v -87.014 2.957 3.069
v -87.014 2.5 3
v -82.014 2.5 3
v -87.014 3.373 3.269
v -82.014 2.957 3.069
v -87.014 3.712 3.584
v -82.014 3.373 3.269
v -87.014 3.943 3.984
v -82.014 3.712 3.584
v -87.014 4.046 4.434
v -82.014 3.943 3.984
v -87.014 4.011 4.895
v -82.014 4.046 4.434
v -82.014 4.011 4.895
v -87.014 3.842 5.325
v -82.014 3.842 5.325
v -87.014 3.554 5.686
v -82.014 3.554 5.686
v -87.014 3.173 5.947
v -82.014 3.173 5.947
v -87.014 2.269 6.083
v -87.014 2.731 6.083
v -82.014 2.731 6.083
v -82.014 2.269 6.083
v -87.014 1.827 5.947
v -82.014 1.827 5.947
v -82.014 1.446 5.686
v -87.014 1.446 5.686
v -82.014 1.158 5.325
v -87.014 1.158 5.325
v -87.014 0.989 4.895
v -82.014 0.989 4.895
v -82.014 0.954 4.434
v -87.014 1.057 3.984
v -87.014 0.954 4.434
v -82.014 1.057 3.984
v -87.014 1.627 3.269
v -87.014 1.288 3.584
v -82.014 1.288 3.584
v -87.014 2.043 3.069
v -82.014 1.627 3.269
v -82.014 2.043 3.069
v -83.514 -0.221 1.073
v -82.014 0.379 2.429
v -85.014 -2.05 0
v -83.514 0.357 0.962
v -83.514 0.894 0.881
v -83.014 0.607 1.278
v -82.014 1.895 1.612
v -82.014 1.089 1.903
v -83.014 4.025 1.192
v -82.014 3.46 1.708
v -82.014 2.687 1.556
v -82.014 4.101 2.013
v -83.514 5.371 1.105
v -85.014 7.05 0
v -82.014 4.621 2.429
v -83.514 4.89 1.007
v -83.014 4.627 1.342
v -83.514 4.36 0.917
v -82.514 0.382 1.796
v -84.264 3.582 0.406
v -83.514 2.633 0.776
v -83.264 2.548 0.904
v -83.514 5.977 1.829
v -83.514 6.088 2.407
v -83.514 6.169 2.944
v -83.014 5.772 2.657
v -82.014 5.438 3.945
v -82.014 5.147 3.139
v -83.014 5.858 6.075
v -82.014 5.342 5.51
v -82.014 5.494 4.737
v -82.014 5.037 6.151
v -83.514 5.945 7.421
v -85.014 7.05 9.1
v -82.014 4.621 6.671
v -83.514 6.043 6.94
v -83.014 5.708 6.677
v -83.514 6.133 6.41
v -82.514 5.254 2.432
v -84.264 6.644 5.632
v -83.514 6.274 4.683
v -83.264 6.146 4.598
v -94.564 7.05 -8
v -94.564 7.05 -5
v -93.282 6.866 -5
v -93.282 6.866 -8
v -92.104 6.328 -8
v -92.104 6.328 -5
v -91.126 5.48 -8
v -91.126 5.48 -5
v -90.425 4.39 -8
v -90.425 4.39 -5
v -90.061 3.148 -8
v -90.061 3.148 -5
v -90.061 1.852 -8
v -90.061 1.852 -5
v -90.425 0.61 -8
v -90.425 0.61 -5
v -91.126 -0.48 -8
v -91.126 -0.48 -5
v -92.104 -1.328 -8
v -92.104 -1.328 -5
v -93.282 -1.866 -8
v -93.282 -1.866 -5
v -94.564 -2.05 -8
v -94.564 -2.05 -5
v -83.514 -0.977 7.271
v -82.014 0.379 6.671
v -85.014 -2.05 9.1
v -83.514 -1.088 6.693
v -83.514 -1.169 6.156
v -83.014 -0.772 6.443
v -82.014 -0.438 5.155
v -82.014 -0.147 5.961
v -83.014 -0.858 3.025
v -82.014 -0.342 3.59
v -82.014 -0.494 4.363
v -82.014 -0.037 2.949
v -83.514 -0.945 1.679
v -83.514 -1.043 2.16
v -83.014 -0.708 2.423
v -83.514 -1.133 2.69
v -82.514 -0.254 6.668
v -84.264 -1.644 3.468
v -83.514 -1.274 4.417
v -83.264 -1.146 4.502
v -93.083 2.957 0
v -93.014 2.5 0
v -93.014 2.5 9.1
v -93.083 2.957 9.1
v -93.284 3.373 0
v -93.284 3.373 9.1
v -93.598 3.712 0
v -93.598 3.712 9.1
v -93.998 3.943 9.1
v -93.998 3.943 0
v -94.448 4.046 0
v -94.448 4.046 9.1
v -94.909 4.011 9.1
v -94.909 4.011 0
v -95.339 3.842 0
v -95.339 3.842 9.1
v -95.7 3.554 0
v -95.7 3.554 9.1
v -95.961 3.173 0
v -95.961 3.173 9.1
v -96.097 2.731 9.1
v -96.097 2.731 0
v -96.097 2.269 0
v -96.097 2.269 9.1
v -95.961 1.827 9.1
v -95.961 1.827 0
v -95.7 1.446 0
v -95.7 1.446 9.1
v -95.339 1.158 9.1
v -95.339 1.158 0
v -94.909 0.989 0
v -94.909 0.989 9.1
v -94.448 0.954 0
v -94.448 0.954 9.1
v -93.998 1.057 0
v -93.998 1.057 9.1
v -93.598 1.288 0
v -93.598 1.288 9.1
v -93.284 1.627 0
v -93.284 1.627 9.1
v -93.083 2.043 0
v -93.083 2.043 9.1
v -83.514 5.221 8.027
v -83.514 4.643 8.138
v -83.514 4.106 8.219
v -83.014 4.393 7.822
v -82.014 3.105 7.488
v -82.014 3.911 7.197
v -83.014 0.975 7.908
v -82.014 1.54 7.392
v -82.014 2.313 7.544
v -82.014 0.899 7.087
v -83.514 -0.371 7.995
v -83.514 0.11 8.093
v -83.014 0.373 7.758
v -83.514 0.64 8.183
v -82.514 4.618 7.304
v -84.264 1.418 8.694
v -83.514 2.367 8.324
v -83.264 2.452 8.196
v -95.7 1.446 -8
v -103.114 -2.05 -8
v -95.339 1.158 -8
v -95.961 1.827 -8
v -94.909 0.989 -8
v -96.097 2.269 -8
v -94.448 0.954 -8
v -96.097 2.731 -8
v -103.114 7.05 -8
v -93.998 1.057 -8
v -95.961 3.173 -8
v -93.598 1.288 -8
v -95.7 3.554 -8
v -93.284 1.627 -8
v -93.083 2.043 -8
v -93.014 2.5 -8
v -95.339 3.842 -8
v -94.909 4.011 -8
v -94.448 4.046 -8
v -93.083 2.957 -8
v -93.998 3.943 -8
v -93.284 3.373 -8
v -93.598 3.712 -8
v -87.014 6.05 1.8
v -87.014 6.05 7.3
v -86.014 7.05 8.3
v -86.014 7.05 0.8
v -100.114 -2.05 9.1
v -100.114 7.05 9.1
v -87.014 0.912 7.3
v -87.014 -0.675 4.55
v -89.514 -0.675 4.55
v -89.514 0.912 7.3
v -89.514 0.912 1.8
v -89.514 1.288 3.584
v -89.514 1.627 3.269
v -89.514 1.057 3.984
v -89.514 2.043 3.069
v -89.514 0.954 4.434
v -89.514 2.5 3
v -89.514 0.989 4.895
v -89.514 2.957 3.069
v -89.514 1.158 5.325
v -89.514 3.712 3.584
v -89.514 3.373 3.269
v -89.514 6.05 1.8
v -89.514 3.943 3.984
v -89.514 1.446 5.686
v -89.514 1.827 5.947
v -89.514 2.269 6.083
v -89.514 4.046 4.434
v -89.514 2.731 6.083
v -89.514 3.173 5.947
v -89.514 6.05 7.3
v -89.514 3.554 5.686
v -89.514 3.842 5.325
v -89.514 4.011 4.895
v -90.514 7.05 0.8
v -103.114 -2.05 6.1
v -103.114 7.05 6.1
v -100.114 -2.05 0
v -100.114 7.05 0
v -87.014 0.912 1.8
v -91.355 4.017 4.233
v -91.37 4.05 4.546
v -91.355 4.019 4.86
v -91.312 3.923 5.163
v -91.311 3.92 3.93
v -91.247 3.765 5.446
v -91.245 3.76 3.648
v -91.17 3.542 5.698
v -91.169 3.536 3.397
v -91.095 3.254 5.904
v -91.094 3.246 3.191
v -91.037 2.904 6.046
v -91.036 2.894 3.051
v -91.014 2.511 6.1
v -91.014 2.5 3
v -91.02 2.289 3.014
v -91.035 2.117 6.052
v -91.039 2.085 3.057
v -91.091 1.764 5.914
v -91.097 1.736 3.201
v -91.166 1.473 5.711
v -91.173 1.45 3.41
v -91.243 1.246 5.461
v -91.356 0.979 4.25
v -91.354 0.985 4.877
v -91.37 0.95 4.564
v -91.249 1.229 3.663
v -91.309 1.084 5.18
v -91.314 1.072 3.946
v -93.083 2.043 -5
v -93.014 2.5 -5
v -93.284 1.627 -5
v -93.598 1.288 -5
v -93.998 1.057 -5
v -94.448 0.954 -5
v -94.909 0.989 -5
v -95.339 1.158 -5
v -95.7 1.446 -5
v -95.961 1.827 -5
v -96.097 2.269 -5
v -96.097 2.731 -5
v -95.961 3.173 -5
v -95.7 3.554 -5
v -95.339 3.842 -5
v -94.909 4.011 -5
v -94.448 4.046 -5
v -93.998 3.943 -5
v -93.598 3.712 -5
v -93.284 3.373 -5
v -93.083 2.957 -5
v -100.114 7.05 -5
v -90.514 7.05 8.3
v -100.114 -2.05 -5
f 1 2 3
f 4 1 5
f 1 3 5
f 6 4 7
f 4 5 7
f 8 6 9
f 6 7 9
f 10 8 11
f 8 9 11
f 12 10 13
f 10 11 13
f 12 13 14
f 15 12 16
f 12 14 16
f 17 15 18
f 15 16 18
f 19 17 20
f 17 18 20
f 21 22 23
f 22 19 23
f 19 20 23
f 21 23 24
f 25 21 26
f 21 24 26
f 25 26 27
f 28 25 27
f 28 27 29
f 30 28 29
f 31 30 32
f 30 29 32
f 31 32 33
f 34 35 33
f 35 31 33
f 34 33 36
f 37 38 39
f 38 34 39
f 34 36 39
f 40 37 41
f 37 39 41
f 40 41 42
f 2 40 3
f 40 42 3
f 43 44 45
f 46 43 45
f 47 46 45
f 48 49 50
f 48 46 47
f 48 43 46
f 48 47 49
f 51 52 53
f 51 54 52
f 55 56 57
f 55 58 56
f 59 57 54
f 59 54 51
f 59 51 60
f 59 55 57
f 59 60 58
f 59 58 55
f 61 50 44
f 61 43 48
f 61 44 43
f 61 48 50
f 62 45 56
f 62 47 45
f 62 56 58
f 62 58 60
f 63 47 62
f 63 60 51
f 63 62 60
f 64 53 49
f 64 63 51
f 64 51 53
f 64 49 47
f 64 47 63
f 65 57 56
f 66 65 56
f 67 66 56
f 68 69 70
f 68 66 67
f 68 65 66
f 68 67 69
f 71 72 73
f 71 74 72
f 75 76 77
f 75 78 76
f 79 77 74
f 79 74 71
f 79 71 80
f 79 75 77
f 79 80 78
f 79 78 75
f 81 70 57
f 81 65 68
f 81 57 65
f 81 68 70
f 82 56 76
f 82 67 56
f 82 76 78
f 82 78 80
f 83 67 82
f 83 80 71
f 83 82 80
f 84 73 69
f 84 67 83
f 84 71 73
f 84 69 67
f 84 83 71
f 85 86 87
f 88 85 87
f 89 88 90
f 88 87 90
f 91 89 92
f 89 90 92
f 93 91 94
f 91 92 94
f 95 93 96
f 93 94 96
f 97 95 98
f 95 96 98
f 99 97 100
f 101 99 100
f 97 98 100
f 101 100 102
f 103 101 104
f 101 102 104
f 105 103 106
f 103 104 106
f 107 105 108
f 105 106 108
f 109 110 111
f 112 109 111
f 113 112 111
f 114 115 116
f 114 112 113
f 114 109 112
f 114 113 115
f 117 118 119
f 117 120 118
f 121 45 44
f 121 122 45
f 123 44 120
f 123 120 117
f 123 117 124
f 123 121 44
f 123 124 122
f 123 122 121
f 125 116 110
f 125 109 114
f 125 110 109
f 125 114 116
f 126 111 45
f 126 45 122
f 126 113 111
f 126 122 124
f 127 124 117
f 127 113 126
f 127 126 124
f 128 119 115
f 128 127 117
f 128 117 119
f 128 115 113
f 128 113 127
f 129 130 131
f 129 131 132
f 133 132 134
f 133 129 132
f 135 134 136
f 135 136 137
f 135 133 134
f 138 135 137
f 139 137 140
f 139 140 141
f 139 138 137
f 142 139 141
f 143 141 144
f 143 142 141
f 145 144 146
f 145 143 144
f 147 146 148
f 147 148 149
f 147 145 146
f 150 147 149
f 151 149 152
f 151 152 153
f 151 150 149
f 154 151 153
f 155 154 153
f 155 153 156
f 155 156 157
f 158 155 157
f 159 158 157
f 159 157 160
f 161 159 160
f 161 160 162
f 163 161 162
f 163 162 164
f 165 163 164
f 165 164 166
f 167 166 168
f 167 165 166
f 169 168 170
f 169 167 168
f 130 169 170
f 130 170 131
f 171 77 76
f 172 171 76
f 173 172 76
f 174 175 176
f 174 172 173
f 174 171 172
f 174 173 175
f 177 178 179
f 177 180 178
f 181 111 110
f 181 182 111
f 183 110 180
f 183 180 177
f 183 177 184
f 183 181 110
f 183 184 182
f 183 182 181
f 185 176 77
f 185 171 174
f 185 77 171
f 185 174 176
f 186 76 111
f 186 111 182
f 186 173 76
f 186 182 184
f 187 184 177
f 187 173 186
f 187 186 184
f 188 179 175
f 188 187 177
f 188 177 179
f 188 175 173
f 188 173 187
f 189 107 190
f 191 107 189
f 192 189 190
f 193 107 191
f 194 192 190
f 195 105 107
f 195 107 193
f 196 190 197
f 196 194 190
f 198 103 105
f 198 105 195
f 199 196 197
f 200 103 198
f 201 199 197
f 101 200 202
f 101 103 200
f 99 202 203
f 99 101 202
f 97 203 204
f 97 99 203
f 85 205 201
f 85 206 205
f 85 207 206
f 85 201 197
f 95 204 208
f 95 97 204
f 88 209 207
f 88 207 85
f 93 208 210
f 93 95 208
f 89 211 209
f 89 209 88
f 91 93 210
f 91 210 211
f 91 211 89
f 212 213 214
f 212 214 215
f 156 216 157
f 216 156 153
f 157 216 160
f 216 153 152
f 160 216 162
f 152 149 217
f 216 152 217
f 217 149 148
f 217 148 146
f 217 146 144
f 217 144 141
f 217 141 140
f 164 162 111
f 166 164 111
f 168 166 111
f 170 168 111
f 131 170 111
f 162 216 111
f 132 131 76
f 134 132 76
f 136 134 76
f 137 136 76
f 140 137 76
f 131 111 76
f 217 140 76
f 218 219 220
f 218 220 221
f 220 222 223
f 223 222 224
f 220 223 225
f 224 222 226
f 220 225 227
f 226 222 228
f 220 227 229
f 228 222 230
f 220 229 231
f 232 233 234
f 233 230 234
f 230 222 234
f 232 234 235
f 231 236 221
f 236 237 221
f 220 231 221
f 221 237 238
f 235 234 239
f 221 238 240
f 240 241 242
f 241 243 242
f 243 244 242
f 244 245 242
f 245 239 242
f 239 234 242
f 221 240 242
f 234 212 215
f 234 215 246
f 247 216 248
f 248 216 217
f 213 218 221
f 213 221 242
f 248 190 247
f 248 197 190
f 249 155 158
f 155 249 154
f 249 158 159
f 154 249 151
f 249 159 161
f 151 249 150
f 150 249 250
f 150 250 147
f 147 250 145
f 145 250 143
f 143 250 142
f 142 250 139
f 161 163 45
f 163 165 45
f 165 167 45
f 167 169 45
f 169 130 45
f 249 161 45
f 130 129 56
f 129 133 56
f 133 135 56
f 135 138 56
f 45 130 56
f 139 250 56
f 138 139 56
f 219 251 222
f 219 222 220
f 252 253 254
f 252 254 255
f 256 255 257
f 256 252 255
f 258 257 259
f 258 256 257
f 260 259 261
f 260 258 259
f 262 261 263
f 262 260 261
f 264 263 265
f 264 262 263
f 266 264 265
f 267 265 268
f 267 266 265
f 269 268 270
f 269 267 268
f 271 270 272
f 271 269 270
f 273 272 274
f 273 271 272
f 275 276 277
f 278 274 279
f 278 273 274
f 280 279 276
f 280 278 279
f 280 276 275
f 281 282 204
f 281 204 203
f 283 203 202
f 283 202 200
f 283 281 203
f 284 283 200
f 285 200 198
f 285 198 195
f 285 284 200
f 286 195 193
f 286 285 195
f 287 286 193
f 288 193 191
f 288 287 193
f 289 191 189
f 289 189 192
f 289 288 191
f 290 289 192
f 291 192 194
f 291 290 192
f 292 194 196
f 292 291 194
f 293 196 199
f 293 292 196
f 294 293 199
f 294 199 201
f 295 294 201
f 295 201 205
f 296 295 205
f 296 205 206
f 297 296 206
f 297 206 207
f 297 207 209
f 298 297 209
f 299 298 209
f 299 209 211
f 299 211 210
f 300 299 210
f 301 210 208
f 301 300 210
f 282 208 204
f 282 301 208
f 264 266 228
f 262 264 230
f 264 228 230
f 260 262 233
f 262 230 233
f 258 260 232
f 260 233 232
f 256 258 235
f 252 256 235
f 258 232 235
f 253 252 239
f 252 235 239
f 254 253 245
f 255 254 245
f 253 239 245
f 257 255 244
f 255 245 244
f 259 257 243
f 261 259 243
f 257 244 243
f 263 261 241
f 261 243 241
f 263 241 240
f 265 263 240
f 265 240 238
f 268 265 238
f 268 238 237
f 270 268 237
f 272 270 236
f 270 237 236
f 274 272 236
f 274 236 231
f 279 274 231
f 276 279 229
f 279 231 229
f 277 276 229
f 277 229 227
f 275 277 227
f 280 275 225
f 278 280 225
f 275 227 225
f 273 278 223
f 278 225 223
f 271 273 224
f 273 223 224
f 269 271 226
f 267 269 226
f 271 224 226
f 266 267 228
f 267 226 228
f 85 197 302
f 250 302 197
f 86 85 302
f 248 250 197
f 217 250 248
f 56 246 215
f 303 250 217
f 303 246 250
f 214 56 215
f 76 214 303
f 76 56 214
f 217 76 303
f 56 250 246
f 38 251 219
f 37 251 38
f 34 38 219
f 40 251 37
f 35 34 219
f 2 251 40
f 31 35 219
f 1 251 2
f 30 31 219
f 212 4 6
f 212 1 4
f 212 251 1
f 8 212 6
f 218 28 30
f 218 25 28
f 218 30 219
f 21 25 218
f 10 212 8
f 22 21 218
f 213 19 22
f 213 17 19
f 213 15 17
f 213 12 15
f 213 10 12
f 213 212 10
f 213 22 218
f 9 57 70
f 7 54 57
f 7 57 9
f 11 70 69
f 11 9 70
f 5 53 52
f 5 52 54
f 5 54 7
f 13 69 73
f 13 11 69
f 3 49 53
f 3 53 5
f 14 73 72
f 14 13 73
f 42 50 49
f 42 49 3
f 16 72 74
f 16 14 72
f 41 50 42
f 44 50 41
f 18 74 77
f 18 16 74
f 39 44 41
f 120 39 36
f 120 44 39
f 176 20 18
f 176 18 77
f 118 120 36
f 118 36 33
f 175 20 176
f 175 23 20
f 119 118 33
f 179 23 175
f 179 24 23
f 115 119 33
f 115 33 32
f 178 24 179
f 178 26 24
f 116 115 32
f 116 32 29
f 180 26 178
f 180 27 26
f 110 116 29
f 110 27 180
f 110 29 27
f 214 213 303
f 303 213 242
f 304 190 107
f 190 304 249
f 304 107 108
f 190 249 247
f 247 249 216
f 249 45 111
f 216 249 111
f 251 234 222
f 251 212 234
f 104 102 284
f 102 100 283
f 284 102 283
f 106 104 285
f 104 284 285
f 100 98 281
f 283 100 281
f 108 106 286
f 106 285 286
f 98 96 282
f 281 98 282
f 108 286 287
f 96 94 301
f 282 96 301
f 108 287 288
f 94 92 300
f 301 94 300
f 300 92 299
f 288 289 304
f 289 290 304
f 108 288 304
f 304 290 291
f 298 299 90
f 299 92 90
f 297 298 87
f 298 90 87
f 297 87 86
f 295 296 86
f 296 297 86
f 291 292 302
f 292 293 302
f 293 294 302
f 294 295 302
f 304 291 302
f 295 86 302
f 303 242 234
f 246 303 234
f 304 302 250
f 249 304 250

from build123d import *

# Parameters (mm, degrees)
SKETCH1_R               = 4.55
SKETCH1_R_2             = 1.55
BOSS_EXTRUDE1_DEPTH     = 9.1
SKETCH2_R               = 1.55
BOSS_EXTRUDE2_DEPTH     = 3
SKETCH3_W               = 17.1
SKETCH3_H               = 9.1
BOSS_EXTRUDE3_DEPTH     = 3
CUT_EXTRUDE1_REACH      = 26.036
CUT_EXTRUDE1_END_RADIUS = 3.55
SKETCH4_R               = 1.55
SKETCH5_R               = 1.55
CUT_EXTRUDE2_DEPTH      = 2.5
CHAMFER1_SIZE           = 1
CHAMFER2_SIZE           = 3


with BuildPart() as part:
    # Sketch1 → Boss-Extrude1 (new body)
    # profile 1 of 3: a face of its own
    with BuildSketch(Plane.XY):
        with Locations((-94.564189657, 2.5)):
            Circle(SKETCH1_R)
        with Locations((-94.564189657, 2.5)):
            Circle(SKETCH1_R_2, mode=Mode.SUBTRACT)
    # profile 2 of 3: a face of its own
    with BuildSketch(Plane.XY):
        with BuildLine():
            ThreePointArc((-94.564189657, -2.05), (-99.114189657, 2.5), (-94.564189657, 7.05))
            Line((-94.564189657, 7.05), (-100.114189657, 7.05))
            Line((-100.114189657, 7.05), (-100.114189657, -2.05))
            Line((-100.114189657, -2.05), (-94.564189657, -2.05))
        make_face()
    # profile 3 of 3: a face of its own
    with BuildSketch(Plane.XY):
        with BuildLine():
            Line((-85.014189657, 7.05), (-94.564189657, 7.05))
            ThreePointArc((-94.564189657, 7.05), (-91.346853802, 5.717335854), (-90.014189657, 2.5))
            ThreePointArc((-90.014189657, 2.5), (-91.346853802, -0.717335854), (-94.564189657, -2.05))
            Line((-94.564189657, -2.05), (-85.014189657, -2.05))
            Line((-85.014189657, -2.05), (-85.014189657, 7.05))
        make_face()
    extrude(amount=BOSS_EXTRUDE1_DEPTH)



with BuildPart() as body_2:
    # Sketch2 → Boss-Extrude2 (new body)
    # profile 1 of 2: a face of its own
    with BuildSketch(Plane(origin=(0, 0, -5), x_dir=(-1, 0, 0), z_dir=(0, 0, -1))):
        with BuildLine():
            ThreePointArc((99.114189657, 2.5), (97.781525511, 5.717335854), (94.564189657, 7.05))
            ThreePointArc((94.564189657, 7.05), (90.014189657, 2.5), (94.564189657, -2.05))
            ThreePointArc((94.564189657, -2.05), (97.781525511, -0.717335854), (99.114189657, 2.5))
        make_face()
        with Locations(Location((94.564189657, 2.5, 0), (0, 0, 180))):
            Circle(SKETCH2_R, mode=Mode.SUBTRACT)
    # profile 2 of 2: a face of its own
    with BuildSketch(Plane(origin=(0, 0, -5), x_dir=(-1, 0, 0), z_dir=(0, 0, -1))):
        with BuildLine():
            Line((100.114189657, -2.05), (100.114189657, 7.05))
            Line((100.114189657, 7.05), (94.564189657, 7.05))
            ThreePointArc((94.564189657, 7.05), (97.781525511, 5.717335854), (99.114189657, 2.5))
            ThreePointArc((99.114189657, 2.5), (97.781525511, -0.717335854), (94.564189657, -2.05))
            Line((94.564189657, -2.05), (100.114189657, -2.05))
        make_face()
    extrude(amount=BOSS_EXTRUDE2_DEPTH)


with BuildPart() as part_1:
    add(part.part)

    add(body_2.part)  # Boss-Extrude3 merges body 2
    # Sketch3 → Boss-Extrude3 (add)
    with BuildSketch(Plane.ZY.offset(100.114189657)):
        with Locations((0.55, 2.5)):
            Rectangle(SKETCH3_W, SKETCH3_H)
    extrude(amount=BOSS_EXTRUDE3_DEPTH)

    # Loft1: read off the stored shape, not the designer's step
    # Loft1: loft between two sections, ruled curve by curve
    loft1_from = [
        Edge.make_bspline([(-85.014189657, -2.05, 9.1), (-85.014189657, -2.05, 8.341666667), (-85.014189657, -2.05, 7.583333333), (-85.014189657, -2.05, 6.066666667), (-85.014189657, -2.05, 5.308333333), (-85.014189657, -2.05, 3.791666667), (-85.014189657, -2.05, 3.033333333), (-85.014189657, -2.05, 1.516666667), (-85.014189657, -2.05, 0.758333333), (-85.014189657, -2.05, 0)], [0, 0, 0, 0, 0.25, 0.25, 0.5, 0.5, 0.75, 0.75, 1, 1, 1, 1], 3),
        Edge.make_bspline([(-85.014189657, -2.05, 0), (-85.014189657, -1.291666667, 0), (-85.014189657, -0.533333333, 0), (-85.014189657, 0.983333333, 0), (-85.014189657, 1.741666667, 0), (-85.014189657, 3.258333333, 0), (-85.014189657, 4.016666667, 0), (-85.014189657, 5.533333333, 0), (-85.014189657, 6.291666667, 0), (-85.014189657, 7.05, 0)], [0, 0, 0, 0, 0.25, 0.25, 0.5, 0.5, 0.75, 0.75, 1, 1, 1, 1], 3),
        Edge.make_bspline([(-85.014189657, 7.05, 9.1), (-85.014189657, 6.291666667, 9.1), (-85.014189657, 5.533333333, 9.1), (-85.014189657, 4.016666667, 9.1), (-85.014189657, 3.258333333, 9.1), (-85.014189657, 1.741666667, 9.1), (-85.014189657, 0.983333333, 9.1), (-85.014189657, -0.533333333, 9.1), (-85.014189657, -1.291666667, 9.1), (-85.014189657, -2.05, 9.1)], [0, 0, 0, 0, 0.25, 0.25, 0.5, 0.5, 0.75, 0.75, 1, 1, 1, 1], 3),
        Edge.make_bspline([(-85.014189657, 7.05, 0), (-85.014189657, 7.05, 0.758333333), (-85.014189657, 7.05, 1.516666667), (-85.014189657, 7.05, 3.033333333), (-85.014189657, 7.05, 3.791666667), (-85.014189657, 7.05, 5.308333333), (-85.014189657, 7.05, 6.066666667), (-85.014189657, 7.05, 7.583333333), (-85.014189657, 7.05, 8.341666667), (-85.014189657, 7.05, 9.1)], [0, 0, 0, 0, 0.25, 0.25, 0.5, 0.5, 0.75, 0.75, 1, 1, 1, 1], 3),
    ]
    loft1_to = [
        Edge.make_bspline([(-82.014189657, 0.378679656, 6.671320344), (-82.014189657, 0.128679656, 6.421320344), (-82.014189657, -0.095475789, 6.106038327), (-82.014189657, -0.410975479, 5.377025758), (-82.014189657, -0.5, 4.964213562), (-82.014189657, -0.5, 4.135786438), (-82.014189657, -0.410975479, 3.722974242), (-82.014189657, -0.095475789, 2.993961673), (-82.014189657, 0.128679656, 2.678679656), (-82.014189657, 0.378679656, 2.428679656)], [0, 0, 0, 0, 0.25, 0.25, 0.5, 0.5, 0.75, 0.75, 1, 1, 1, 1], 3),
        Edge.make_bspline([(-82.014189657, 0.378679656, 2.428679656), (-82.014189657, 0.628679656, 2.178679656), (-82.014189657, 0.943961673, 1.954524211), (-82.014189657, 1.672974242, 1.639024521), (-82.014189657, 2.085786438, 1.55), (-82.014189657, 2.914213562, 1.55), (-82.014189657, 3.327025758, 1.639024521), (-82.014189657, 4.056038327, 1.954524211), (-82.014189657, 4.371320344, 2.178679656), (-82.014189657, 4.621320344, 2.428679656)], [0, 0, 0, 0, 0.25, 0.25, 0.5, 0.5, 0.75, 0.75, 1, 1, 1, 1], 3),
        Edge.make_bspline([(-82.014189657, 4.621320344, 6.671320344), (-82.014189657, 4.371320344, 6.921320344), (-82.014189657, 4.056038327, 7.145475789), (-82.014189657, 3.327025758, 7.460975479), (-82.014189657, 2.914213562, 7.55), (-82.014189657, 2.085786438, 7.55), (-82.014189657, 1.672974242, 7.460975479), (-82.014189657, 0.943961673, 7.145475789), (-82.014189657, 0.628679656, 6.921320344), (-82.014189657, 0.378679656, 6.671320344)], [0, 0, 0, 0, 0.25, 0.25, 0.5, 0.5, 0.75, 0.75, 1, 1, 1, 1], 3),
        Edge.make_bspline([(-82.014189657, 4.621320344, 2.428679656), (-82.014189657, 4.871320344, 2.678679656), (-82.014189657, 5.095475789, 2.993961673), (-82.014189657, 5.410975479, 3.722974242), (-82.014189657, 5.5, 4.135786438), (-82.014189657, 5.5, 4.964213562), (-82.014189657, 5.410975479, 5.377025758), (-82.014189657, 5.095475789, 6.106038327), (-82.014189657, 4.871320344, 6.421320344), (-82.014189657, 4.621320344, 6.671320344)], [0, 0, 0, 0, 0.25, 0.25, 0.5, 0.5, 0.75, 0.75, 1, 1, 1, 1], 3),
    ]
    loft1 = Solid(Shell([*[Face.make_surface_from_curves(loft1_from[k], loft1_to[k]) for k in range(4)], Face(Wire(loft1_from)), Face(Wire(loft1_to))]))
    add(loft1)

    # Cut-Extrude1: up to this cylinder (the profile starts outside it)
    cut_extrude1_end = Plane(origin=(-94.564189657, 2.5, 4.55), z_dir=(0, 0, -1)) * Cylinder(CUT_EXTRUDE1_END_RADIUS, 60.172, mode=Mode.PRIVATE)
    # Sketch4 → Cut-Extrude1 (cut, up to the surface)
    with BuildSketch(Plane(origin=(-82.014189657, 0, 0), x_dir=(0, 0, -1), z_dir=(1, 0, 0)), mode=Mode.PRIVATE) as cut_extrude1_sk1:
        with Locations((-4.55, 2.5)):
            Circle(SKETCH4_R)
    cut_extrude1_tool1 = extrude(cut_extrude1_sk1.sketch, amount=-CUT_EXTRUDE1_REACH, mode=Mode.PRIVATE) - cut_extrude1_end
    add(cut_extrude1_tool1.solids().sort_by_distance((-82.01419, 2.5, 4.55))[0], mode=Mode.SUBTRACT)

    # Sketch5 → Cut-Extrude2 (cut)
    # profile 1 of 2: a face of its own
    with BuildSketch(Plane.ZY.offset(87.014189657)):
        Polygon((4.55, 5.675426481), (7.3, 4.08771324), (7.3, 7.05), (1.8, 7.05), (1.8, 4.08771324), align=None)
    # profile 2 of 2: a face of its own
    with BuildSketch(Plane.ZY.offset(87.014189657)):
        Polygon((7.3, 0.91228676), (7.3, 4.08771324), (4.55, 5.675426481), (1.8, 4.08771324), (1.8, 0.91228676), (4.55, -0.675426481), align=None)
        with Locations(Location((4.55, 2.5, 0), (0, 0, 180))):
            Circle(SKETCH5_R, mode=Mode.SUBTRACT)
    extrude(amount=CUT_EXTRUDE2_DEPTH, mode=Mode.SUBTRACT)

    # Chamfer1
    chamfer1_edges = [part_1.edges().sort_by_distance(p)[0] for p in [
        (-87.014189657, 7.05, 4.55),
        (-88.264189657, 7.05, 7.3),
        (-88.264189657, 7.05, 1.8),
        (-89.514189657, 7.05, 4.55),
    ]]
    chamfer(chamfer1_edges, length=CHAMFER1_SIZE)

    # Chamfer2
    chamfer2_edges = [part_1.edges().sort_by_distance(p)[0] for p in [
        (-103.114189657, 2.5, 9.1),
    ]]
    chamfer(chamfer2_edges, length=CHAMFER2_SIZE)


solid = part_1.part
